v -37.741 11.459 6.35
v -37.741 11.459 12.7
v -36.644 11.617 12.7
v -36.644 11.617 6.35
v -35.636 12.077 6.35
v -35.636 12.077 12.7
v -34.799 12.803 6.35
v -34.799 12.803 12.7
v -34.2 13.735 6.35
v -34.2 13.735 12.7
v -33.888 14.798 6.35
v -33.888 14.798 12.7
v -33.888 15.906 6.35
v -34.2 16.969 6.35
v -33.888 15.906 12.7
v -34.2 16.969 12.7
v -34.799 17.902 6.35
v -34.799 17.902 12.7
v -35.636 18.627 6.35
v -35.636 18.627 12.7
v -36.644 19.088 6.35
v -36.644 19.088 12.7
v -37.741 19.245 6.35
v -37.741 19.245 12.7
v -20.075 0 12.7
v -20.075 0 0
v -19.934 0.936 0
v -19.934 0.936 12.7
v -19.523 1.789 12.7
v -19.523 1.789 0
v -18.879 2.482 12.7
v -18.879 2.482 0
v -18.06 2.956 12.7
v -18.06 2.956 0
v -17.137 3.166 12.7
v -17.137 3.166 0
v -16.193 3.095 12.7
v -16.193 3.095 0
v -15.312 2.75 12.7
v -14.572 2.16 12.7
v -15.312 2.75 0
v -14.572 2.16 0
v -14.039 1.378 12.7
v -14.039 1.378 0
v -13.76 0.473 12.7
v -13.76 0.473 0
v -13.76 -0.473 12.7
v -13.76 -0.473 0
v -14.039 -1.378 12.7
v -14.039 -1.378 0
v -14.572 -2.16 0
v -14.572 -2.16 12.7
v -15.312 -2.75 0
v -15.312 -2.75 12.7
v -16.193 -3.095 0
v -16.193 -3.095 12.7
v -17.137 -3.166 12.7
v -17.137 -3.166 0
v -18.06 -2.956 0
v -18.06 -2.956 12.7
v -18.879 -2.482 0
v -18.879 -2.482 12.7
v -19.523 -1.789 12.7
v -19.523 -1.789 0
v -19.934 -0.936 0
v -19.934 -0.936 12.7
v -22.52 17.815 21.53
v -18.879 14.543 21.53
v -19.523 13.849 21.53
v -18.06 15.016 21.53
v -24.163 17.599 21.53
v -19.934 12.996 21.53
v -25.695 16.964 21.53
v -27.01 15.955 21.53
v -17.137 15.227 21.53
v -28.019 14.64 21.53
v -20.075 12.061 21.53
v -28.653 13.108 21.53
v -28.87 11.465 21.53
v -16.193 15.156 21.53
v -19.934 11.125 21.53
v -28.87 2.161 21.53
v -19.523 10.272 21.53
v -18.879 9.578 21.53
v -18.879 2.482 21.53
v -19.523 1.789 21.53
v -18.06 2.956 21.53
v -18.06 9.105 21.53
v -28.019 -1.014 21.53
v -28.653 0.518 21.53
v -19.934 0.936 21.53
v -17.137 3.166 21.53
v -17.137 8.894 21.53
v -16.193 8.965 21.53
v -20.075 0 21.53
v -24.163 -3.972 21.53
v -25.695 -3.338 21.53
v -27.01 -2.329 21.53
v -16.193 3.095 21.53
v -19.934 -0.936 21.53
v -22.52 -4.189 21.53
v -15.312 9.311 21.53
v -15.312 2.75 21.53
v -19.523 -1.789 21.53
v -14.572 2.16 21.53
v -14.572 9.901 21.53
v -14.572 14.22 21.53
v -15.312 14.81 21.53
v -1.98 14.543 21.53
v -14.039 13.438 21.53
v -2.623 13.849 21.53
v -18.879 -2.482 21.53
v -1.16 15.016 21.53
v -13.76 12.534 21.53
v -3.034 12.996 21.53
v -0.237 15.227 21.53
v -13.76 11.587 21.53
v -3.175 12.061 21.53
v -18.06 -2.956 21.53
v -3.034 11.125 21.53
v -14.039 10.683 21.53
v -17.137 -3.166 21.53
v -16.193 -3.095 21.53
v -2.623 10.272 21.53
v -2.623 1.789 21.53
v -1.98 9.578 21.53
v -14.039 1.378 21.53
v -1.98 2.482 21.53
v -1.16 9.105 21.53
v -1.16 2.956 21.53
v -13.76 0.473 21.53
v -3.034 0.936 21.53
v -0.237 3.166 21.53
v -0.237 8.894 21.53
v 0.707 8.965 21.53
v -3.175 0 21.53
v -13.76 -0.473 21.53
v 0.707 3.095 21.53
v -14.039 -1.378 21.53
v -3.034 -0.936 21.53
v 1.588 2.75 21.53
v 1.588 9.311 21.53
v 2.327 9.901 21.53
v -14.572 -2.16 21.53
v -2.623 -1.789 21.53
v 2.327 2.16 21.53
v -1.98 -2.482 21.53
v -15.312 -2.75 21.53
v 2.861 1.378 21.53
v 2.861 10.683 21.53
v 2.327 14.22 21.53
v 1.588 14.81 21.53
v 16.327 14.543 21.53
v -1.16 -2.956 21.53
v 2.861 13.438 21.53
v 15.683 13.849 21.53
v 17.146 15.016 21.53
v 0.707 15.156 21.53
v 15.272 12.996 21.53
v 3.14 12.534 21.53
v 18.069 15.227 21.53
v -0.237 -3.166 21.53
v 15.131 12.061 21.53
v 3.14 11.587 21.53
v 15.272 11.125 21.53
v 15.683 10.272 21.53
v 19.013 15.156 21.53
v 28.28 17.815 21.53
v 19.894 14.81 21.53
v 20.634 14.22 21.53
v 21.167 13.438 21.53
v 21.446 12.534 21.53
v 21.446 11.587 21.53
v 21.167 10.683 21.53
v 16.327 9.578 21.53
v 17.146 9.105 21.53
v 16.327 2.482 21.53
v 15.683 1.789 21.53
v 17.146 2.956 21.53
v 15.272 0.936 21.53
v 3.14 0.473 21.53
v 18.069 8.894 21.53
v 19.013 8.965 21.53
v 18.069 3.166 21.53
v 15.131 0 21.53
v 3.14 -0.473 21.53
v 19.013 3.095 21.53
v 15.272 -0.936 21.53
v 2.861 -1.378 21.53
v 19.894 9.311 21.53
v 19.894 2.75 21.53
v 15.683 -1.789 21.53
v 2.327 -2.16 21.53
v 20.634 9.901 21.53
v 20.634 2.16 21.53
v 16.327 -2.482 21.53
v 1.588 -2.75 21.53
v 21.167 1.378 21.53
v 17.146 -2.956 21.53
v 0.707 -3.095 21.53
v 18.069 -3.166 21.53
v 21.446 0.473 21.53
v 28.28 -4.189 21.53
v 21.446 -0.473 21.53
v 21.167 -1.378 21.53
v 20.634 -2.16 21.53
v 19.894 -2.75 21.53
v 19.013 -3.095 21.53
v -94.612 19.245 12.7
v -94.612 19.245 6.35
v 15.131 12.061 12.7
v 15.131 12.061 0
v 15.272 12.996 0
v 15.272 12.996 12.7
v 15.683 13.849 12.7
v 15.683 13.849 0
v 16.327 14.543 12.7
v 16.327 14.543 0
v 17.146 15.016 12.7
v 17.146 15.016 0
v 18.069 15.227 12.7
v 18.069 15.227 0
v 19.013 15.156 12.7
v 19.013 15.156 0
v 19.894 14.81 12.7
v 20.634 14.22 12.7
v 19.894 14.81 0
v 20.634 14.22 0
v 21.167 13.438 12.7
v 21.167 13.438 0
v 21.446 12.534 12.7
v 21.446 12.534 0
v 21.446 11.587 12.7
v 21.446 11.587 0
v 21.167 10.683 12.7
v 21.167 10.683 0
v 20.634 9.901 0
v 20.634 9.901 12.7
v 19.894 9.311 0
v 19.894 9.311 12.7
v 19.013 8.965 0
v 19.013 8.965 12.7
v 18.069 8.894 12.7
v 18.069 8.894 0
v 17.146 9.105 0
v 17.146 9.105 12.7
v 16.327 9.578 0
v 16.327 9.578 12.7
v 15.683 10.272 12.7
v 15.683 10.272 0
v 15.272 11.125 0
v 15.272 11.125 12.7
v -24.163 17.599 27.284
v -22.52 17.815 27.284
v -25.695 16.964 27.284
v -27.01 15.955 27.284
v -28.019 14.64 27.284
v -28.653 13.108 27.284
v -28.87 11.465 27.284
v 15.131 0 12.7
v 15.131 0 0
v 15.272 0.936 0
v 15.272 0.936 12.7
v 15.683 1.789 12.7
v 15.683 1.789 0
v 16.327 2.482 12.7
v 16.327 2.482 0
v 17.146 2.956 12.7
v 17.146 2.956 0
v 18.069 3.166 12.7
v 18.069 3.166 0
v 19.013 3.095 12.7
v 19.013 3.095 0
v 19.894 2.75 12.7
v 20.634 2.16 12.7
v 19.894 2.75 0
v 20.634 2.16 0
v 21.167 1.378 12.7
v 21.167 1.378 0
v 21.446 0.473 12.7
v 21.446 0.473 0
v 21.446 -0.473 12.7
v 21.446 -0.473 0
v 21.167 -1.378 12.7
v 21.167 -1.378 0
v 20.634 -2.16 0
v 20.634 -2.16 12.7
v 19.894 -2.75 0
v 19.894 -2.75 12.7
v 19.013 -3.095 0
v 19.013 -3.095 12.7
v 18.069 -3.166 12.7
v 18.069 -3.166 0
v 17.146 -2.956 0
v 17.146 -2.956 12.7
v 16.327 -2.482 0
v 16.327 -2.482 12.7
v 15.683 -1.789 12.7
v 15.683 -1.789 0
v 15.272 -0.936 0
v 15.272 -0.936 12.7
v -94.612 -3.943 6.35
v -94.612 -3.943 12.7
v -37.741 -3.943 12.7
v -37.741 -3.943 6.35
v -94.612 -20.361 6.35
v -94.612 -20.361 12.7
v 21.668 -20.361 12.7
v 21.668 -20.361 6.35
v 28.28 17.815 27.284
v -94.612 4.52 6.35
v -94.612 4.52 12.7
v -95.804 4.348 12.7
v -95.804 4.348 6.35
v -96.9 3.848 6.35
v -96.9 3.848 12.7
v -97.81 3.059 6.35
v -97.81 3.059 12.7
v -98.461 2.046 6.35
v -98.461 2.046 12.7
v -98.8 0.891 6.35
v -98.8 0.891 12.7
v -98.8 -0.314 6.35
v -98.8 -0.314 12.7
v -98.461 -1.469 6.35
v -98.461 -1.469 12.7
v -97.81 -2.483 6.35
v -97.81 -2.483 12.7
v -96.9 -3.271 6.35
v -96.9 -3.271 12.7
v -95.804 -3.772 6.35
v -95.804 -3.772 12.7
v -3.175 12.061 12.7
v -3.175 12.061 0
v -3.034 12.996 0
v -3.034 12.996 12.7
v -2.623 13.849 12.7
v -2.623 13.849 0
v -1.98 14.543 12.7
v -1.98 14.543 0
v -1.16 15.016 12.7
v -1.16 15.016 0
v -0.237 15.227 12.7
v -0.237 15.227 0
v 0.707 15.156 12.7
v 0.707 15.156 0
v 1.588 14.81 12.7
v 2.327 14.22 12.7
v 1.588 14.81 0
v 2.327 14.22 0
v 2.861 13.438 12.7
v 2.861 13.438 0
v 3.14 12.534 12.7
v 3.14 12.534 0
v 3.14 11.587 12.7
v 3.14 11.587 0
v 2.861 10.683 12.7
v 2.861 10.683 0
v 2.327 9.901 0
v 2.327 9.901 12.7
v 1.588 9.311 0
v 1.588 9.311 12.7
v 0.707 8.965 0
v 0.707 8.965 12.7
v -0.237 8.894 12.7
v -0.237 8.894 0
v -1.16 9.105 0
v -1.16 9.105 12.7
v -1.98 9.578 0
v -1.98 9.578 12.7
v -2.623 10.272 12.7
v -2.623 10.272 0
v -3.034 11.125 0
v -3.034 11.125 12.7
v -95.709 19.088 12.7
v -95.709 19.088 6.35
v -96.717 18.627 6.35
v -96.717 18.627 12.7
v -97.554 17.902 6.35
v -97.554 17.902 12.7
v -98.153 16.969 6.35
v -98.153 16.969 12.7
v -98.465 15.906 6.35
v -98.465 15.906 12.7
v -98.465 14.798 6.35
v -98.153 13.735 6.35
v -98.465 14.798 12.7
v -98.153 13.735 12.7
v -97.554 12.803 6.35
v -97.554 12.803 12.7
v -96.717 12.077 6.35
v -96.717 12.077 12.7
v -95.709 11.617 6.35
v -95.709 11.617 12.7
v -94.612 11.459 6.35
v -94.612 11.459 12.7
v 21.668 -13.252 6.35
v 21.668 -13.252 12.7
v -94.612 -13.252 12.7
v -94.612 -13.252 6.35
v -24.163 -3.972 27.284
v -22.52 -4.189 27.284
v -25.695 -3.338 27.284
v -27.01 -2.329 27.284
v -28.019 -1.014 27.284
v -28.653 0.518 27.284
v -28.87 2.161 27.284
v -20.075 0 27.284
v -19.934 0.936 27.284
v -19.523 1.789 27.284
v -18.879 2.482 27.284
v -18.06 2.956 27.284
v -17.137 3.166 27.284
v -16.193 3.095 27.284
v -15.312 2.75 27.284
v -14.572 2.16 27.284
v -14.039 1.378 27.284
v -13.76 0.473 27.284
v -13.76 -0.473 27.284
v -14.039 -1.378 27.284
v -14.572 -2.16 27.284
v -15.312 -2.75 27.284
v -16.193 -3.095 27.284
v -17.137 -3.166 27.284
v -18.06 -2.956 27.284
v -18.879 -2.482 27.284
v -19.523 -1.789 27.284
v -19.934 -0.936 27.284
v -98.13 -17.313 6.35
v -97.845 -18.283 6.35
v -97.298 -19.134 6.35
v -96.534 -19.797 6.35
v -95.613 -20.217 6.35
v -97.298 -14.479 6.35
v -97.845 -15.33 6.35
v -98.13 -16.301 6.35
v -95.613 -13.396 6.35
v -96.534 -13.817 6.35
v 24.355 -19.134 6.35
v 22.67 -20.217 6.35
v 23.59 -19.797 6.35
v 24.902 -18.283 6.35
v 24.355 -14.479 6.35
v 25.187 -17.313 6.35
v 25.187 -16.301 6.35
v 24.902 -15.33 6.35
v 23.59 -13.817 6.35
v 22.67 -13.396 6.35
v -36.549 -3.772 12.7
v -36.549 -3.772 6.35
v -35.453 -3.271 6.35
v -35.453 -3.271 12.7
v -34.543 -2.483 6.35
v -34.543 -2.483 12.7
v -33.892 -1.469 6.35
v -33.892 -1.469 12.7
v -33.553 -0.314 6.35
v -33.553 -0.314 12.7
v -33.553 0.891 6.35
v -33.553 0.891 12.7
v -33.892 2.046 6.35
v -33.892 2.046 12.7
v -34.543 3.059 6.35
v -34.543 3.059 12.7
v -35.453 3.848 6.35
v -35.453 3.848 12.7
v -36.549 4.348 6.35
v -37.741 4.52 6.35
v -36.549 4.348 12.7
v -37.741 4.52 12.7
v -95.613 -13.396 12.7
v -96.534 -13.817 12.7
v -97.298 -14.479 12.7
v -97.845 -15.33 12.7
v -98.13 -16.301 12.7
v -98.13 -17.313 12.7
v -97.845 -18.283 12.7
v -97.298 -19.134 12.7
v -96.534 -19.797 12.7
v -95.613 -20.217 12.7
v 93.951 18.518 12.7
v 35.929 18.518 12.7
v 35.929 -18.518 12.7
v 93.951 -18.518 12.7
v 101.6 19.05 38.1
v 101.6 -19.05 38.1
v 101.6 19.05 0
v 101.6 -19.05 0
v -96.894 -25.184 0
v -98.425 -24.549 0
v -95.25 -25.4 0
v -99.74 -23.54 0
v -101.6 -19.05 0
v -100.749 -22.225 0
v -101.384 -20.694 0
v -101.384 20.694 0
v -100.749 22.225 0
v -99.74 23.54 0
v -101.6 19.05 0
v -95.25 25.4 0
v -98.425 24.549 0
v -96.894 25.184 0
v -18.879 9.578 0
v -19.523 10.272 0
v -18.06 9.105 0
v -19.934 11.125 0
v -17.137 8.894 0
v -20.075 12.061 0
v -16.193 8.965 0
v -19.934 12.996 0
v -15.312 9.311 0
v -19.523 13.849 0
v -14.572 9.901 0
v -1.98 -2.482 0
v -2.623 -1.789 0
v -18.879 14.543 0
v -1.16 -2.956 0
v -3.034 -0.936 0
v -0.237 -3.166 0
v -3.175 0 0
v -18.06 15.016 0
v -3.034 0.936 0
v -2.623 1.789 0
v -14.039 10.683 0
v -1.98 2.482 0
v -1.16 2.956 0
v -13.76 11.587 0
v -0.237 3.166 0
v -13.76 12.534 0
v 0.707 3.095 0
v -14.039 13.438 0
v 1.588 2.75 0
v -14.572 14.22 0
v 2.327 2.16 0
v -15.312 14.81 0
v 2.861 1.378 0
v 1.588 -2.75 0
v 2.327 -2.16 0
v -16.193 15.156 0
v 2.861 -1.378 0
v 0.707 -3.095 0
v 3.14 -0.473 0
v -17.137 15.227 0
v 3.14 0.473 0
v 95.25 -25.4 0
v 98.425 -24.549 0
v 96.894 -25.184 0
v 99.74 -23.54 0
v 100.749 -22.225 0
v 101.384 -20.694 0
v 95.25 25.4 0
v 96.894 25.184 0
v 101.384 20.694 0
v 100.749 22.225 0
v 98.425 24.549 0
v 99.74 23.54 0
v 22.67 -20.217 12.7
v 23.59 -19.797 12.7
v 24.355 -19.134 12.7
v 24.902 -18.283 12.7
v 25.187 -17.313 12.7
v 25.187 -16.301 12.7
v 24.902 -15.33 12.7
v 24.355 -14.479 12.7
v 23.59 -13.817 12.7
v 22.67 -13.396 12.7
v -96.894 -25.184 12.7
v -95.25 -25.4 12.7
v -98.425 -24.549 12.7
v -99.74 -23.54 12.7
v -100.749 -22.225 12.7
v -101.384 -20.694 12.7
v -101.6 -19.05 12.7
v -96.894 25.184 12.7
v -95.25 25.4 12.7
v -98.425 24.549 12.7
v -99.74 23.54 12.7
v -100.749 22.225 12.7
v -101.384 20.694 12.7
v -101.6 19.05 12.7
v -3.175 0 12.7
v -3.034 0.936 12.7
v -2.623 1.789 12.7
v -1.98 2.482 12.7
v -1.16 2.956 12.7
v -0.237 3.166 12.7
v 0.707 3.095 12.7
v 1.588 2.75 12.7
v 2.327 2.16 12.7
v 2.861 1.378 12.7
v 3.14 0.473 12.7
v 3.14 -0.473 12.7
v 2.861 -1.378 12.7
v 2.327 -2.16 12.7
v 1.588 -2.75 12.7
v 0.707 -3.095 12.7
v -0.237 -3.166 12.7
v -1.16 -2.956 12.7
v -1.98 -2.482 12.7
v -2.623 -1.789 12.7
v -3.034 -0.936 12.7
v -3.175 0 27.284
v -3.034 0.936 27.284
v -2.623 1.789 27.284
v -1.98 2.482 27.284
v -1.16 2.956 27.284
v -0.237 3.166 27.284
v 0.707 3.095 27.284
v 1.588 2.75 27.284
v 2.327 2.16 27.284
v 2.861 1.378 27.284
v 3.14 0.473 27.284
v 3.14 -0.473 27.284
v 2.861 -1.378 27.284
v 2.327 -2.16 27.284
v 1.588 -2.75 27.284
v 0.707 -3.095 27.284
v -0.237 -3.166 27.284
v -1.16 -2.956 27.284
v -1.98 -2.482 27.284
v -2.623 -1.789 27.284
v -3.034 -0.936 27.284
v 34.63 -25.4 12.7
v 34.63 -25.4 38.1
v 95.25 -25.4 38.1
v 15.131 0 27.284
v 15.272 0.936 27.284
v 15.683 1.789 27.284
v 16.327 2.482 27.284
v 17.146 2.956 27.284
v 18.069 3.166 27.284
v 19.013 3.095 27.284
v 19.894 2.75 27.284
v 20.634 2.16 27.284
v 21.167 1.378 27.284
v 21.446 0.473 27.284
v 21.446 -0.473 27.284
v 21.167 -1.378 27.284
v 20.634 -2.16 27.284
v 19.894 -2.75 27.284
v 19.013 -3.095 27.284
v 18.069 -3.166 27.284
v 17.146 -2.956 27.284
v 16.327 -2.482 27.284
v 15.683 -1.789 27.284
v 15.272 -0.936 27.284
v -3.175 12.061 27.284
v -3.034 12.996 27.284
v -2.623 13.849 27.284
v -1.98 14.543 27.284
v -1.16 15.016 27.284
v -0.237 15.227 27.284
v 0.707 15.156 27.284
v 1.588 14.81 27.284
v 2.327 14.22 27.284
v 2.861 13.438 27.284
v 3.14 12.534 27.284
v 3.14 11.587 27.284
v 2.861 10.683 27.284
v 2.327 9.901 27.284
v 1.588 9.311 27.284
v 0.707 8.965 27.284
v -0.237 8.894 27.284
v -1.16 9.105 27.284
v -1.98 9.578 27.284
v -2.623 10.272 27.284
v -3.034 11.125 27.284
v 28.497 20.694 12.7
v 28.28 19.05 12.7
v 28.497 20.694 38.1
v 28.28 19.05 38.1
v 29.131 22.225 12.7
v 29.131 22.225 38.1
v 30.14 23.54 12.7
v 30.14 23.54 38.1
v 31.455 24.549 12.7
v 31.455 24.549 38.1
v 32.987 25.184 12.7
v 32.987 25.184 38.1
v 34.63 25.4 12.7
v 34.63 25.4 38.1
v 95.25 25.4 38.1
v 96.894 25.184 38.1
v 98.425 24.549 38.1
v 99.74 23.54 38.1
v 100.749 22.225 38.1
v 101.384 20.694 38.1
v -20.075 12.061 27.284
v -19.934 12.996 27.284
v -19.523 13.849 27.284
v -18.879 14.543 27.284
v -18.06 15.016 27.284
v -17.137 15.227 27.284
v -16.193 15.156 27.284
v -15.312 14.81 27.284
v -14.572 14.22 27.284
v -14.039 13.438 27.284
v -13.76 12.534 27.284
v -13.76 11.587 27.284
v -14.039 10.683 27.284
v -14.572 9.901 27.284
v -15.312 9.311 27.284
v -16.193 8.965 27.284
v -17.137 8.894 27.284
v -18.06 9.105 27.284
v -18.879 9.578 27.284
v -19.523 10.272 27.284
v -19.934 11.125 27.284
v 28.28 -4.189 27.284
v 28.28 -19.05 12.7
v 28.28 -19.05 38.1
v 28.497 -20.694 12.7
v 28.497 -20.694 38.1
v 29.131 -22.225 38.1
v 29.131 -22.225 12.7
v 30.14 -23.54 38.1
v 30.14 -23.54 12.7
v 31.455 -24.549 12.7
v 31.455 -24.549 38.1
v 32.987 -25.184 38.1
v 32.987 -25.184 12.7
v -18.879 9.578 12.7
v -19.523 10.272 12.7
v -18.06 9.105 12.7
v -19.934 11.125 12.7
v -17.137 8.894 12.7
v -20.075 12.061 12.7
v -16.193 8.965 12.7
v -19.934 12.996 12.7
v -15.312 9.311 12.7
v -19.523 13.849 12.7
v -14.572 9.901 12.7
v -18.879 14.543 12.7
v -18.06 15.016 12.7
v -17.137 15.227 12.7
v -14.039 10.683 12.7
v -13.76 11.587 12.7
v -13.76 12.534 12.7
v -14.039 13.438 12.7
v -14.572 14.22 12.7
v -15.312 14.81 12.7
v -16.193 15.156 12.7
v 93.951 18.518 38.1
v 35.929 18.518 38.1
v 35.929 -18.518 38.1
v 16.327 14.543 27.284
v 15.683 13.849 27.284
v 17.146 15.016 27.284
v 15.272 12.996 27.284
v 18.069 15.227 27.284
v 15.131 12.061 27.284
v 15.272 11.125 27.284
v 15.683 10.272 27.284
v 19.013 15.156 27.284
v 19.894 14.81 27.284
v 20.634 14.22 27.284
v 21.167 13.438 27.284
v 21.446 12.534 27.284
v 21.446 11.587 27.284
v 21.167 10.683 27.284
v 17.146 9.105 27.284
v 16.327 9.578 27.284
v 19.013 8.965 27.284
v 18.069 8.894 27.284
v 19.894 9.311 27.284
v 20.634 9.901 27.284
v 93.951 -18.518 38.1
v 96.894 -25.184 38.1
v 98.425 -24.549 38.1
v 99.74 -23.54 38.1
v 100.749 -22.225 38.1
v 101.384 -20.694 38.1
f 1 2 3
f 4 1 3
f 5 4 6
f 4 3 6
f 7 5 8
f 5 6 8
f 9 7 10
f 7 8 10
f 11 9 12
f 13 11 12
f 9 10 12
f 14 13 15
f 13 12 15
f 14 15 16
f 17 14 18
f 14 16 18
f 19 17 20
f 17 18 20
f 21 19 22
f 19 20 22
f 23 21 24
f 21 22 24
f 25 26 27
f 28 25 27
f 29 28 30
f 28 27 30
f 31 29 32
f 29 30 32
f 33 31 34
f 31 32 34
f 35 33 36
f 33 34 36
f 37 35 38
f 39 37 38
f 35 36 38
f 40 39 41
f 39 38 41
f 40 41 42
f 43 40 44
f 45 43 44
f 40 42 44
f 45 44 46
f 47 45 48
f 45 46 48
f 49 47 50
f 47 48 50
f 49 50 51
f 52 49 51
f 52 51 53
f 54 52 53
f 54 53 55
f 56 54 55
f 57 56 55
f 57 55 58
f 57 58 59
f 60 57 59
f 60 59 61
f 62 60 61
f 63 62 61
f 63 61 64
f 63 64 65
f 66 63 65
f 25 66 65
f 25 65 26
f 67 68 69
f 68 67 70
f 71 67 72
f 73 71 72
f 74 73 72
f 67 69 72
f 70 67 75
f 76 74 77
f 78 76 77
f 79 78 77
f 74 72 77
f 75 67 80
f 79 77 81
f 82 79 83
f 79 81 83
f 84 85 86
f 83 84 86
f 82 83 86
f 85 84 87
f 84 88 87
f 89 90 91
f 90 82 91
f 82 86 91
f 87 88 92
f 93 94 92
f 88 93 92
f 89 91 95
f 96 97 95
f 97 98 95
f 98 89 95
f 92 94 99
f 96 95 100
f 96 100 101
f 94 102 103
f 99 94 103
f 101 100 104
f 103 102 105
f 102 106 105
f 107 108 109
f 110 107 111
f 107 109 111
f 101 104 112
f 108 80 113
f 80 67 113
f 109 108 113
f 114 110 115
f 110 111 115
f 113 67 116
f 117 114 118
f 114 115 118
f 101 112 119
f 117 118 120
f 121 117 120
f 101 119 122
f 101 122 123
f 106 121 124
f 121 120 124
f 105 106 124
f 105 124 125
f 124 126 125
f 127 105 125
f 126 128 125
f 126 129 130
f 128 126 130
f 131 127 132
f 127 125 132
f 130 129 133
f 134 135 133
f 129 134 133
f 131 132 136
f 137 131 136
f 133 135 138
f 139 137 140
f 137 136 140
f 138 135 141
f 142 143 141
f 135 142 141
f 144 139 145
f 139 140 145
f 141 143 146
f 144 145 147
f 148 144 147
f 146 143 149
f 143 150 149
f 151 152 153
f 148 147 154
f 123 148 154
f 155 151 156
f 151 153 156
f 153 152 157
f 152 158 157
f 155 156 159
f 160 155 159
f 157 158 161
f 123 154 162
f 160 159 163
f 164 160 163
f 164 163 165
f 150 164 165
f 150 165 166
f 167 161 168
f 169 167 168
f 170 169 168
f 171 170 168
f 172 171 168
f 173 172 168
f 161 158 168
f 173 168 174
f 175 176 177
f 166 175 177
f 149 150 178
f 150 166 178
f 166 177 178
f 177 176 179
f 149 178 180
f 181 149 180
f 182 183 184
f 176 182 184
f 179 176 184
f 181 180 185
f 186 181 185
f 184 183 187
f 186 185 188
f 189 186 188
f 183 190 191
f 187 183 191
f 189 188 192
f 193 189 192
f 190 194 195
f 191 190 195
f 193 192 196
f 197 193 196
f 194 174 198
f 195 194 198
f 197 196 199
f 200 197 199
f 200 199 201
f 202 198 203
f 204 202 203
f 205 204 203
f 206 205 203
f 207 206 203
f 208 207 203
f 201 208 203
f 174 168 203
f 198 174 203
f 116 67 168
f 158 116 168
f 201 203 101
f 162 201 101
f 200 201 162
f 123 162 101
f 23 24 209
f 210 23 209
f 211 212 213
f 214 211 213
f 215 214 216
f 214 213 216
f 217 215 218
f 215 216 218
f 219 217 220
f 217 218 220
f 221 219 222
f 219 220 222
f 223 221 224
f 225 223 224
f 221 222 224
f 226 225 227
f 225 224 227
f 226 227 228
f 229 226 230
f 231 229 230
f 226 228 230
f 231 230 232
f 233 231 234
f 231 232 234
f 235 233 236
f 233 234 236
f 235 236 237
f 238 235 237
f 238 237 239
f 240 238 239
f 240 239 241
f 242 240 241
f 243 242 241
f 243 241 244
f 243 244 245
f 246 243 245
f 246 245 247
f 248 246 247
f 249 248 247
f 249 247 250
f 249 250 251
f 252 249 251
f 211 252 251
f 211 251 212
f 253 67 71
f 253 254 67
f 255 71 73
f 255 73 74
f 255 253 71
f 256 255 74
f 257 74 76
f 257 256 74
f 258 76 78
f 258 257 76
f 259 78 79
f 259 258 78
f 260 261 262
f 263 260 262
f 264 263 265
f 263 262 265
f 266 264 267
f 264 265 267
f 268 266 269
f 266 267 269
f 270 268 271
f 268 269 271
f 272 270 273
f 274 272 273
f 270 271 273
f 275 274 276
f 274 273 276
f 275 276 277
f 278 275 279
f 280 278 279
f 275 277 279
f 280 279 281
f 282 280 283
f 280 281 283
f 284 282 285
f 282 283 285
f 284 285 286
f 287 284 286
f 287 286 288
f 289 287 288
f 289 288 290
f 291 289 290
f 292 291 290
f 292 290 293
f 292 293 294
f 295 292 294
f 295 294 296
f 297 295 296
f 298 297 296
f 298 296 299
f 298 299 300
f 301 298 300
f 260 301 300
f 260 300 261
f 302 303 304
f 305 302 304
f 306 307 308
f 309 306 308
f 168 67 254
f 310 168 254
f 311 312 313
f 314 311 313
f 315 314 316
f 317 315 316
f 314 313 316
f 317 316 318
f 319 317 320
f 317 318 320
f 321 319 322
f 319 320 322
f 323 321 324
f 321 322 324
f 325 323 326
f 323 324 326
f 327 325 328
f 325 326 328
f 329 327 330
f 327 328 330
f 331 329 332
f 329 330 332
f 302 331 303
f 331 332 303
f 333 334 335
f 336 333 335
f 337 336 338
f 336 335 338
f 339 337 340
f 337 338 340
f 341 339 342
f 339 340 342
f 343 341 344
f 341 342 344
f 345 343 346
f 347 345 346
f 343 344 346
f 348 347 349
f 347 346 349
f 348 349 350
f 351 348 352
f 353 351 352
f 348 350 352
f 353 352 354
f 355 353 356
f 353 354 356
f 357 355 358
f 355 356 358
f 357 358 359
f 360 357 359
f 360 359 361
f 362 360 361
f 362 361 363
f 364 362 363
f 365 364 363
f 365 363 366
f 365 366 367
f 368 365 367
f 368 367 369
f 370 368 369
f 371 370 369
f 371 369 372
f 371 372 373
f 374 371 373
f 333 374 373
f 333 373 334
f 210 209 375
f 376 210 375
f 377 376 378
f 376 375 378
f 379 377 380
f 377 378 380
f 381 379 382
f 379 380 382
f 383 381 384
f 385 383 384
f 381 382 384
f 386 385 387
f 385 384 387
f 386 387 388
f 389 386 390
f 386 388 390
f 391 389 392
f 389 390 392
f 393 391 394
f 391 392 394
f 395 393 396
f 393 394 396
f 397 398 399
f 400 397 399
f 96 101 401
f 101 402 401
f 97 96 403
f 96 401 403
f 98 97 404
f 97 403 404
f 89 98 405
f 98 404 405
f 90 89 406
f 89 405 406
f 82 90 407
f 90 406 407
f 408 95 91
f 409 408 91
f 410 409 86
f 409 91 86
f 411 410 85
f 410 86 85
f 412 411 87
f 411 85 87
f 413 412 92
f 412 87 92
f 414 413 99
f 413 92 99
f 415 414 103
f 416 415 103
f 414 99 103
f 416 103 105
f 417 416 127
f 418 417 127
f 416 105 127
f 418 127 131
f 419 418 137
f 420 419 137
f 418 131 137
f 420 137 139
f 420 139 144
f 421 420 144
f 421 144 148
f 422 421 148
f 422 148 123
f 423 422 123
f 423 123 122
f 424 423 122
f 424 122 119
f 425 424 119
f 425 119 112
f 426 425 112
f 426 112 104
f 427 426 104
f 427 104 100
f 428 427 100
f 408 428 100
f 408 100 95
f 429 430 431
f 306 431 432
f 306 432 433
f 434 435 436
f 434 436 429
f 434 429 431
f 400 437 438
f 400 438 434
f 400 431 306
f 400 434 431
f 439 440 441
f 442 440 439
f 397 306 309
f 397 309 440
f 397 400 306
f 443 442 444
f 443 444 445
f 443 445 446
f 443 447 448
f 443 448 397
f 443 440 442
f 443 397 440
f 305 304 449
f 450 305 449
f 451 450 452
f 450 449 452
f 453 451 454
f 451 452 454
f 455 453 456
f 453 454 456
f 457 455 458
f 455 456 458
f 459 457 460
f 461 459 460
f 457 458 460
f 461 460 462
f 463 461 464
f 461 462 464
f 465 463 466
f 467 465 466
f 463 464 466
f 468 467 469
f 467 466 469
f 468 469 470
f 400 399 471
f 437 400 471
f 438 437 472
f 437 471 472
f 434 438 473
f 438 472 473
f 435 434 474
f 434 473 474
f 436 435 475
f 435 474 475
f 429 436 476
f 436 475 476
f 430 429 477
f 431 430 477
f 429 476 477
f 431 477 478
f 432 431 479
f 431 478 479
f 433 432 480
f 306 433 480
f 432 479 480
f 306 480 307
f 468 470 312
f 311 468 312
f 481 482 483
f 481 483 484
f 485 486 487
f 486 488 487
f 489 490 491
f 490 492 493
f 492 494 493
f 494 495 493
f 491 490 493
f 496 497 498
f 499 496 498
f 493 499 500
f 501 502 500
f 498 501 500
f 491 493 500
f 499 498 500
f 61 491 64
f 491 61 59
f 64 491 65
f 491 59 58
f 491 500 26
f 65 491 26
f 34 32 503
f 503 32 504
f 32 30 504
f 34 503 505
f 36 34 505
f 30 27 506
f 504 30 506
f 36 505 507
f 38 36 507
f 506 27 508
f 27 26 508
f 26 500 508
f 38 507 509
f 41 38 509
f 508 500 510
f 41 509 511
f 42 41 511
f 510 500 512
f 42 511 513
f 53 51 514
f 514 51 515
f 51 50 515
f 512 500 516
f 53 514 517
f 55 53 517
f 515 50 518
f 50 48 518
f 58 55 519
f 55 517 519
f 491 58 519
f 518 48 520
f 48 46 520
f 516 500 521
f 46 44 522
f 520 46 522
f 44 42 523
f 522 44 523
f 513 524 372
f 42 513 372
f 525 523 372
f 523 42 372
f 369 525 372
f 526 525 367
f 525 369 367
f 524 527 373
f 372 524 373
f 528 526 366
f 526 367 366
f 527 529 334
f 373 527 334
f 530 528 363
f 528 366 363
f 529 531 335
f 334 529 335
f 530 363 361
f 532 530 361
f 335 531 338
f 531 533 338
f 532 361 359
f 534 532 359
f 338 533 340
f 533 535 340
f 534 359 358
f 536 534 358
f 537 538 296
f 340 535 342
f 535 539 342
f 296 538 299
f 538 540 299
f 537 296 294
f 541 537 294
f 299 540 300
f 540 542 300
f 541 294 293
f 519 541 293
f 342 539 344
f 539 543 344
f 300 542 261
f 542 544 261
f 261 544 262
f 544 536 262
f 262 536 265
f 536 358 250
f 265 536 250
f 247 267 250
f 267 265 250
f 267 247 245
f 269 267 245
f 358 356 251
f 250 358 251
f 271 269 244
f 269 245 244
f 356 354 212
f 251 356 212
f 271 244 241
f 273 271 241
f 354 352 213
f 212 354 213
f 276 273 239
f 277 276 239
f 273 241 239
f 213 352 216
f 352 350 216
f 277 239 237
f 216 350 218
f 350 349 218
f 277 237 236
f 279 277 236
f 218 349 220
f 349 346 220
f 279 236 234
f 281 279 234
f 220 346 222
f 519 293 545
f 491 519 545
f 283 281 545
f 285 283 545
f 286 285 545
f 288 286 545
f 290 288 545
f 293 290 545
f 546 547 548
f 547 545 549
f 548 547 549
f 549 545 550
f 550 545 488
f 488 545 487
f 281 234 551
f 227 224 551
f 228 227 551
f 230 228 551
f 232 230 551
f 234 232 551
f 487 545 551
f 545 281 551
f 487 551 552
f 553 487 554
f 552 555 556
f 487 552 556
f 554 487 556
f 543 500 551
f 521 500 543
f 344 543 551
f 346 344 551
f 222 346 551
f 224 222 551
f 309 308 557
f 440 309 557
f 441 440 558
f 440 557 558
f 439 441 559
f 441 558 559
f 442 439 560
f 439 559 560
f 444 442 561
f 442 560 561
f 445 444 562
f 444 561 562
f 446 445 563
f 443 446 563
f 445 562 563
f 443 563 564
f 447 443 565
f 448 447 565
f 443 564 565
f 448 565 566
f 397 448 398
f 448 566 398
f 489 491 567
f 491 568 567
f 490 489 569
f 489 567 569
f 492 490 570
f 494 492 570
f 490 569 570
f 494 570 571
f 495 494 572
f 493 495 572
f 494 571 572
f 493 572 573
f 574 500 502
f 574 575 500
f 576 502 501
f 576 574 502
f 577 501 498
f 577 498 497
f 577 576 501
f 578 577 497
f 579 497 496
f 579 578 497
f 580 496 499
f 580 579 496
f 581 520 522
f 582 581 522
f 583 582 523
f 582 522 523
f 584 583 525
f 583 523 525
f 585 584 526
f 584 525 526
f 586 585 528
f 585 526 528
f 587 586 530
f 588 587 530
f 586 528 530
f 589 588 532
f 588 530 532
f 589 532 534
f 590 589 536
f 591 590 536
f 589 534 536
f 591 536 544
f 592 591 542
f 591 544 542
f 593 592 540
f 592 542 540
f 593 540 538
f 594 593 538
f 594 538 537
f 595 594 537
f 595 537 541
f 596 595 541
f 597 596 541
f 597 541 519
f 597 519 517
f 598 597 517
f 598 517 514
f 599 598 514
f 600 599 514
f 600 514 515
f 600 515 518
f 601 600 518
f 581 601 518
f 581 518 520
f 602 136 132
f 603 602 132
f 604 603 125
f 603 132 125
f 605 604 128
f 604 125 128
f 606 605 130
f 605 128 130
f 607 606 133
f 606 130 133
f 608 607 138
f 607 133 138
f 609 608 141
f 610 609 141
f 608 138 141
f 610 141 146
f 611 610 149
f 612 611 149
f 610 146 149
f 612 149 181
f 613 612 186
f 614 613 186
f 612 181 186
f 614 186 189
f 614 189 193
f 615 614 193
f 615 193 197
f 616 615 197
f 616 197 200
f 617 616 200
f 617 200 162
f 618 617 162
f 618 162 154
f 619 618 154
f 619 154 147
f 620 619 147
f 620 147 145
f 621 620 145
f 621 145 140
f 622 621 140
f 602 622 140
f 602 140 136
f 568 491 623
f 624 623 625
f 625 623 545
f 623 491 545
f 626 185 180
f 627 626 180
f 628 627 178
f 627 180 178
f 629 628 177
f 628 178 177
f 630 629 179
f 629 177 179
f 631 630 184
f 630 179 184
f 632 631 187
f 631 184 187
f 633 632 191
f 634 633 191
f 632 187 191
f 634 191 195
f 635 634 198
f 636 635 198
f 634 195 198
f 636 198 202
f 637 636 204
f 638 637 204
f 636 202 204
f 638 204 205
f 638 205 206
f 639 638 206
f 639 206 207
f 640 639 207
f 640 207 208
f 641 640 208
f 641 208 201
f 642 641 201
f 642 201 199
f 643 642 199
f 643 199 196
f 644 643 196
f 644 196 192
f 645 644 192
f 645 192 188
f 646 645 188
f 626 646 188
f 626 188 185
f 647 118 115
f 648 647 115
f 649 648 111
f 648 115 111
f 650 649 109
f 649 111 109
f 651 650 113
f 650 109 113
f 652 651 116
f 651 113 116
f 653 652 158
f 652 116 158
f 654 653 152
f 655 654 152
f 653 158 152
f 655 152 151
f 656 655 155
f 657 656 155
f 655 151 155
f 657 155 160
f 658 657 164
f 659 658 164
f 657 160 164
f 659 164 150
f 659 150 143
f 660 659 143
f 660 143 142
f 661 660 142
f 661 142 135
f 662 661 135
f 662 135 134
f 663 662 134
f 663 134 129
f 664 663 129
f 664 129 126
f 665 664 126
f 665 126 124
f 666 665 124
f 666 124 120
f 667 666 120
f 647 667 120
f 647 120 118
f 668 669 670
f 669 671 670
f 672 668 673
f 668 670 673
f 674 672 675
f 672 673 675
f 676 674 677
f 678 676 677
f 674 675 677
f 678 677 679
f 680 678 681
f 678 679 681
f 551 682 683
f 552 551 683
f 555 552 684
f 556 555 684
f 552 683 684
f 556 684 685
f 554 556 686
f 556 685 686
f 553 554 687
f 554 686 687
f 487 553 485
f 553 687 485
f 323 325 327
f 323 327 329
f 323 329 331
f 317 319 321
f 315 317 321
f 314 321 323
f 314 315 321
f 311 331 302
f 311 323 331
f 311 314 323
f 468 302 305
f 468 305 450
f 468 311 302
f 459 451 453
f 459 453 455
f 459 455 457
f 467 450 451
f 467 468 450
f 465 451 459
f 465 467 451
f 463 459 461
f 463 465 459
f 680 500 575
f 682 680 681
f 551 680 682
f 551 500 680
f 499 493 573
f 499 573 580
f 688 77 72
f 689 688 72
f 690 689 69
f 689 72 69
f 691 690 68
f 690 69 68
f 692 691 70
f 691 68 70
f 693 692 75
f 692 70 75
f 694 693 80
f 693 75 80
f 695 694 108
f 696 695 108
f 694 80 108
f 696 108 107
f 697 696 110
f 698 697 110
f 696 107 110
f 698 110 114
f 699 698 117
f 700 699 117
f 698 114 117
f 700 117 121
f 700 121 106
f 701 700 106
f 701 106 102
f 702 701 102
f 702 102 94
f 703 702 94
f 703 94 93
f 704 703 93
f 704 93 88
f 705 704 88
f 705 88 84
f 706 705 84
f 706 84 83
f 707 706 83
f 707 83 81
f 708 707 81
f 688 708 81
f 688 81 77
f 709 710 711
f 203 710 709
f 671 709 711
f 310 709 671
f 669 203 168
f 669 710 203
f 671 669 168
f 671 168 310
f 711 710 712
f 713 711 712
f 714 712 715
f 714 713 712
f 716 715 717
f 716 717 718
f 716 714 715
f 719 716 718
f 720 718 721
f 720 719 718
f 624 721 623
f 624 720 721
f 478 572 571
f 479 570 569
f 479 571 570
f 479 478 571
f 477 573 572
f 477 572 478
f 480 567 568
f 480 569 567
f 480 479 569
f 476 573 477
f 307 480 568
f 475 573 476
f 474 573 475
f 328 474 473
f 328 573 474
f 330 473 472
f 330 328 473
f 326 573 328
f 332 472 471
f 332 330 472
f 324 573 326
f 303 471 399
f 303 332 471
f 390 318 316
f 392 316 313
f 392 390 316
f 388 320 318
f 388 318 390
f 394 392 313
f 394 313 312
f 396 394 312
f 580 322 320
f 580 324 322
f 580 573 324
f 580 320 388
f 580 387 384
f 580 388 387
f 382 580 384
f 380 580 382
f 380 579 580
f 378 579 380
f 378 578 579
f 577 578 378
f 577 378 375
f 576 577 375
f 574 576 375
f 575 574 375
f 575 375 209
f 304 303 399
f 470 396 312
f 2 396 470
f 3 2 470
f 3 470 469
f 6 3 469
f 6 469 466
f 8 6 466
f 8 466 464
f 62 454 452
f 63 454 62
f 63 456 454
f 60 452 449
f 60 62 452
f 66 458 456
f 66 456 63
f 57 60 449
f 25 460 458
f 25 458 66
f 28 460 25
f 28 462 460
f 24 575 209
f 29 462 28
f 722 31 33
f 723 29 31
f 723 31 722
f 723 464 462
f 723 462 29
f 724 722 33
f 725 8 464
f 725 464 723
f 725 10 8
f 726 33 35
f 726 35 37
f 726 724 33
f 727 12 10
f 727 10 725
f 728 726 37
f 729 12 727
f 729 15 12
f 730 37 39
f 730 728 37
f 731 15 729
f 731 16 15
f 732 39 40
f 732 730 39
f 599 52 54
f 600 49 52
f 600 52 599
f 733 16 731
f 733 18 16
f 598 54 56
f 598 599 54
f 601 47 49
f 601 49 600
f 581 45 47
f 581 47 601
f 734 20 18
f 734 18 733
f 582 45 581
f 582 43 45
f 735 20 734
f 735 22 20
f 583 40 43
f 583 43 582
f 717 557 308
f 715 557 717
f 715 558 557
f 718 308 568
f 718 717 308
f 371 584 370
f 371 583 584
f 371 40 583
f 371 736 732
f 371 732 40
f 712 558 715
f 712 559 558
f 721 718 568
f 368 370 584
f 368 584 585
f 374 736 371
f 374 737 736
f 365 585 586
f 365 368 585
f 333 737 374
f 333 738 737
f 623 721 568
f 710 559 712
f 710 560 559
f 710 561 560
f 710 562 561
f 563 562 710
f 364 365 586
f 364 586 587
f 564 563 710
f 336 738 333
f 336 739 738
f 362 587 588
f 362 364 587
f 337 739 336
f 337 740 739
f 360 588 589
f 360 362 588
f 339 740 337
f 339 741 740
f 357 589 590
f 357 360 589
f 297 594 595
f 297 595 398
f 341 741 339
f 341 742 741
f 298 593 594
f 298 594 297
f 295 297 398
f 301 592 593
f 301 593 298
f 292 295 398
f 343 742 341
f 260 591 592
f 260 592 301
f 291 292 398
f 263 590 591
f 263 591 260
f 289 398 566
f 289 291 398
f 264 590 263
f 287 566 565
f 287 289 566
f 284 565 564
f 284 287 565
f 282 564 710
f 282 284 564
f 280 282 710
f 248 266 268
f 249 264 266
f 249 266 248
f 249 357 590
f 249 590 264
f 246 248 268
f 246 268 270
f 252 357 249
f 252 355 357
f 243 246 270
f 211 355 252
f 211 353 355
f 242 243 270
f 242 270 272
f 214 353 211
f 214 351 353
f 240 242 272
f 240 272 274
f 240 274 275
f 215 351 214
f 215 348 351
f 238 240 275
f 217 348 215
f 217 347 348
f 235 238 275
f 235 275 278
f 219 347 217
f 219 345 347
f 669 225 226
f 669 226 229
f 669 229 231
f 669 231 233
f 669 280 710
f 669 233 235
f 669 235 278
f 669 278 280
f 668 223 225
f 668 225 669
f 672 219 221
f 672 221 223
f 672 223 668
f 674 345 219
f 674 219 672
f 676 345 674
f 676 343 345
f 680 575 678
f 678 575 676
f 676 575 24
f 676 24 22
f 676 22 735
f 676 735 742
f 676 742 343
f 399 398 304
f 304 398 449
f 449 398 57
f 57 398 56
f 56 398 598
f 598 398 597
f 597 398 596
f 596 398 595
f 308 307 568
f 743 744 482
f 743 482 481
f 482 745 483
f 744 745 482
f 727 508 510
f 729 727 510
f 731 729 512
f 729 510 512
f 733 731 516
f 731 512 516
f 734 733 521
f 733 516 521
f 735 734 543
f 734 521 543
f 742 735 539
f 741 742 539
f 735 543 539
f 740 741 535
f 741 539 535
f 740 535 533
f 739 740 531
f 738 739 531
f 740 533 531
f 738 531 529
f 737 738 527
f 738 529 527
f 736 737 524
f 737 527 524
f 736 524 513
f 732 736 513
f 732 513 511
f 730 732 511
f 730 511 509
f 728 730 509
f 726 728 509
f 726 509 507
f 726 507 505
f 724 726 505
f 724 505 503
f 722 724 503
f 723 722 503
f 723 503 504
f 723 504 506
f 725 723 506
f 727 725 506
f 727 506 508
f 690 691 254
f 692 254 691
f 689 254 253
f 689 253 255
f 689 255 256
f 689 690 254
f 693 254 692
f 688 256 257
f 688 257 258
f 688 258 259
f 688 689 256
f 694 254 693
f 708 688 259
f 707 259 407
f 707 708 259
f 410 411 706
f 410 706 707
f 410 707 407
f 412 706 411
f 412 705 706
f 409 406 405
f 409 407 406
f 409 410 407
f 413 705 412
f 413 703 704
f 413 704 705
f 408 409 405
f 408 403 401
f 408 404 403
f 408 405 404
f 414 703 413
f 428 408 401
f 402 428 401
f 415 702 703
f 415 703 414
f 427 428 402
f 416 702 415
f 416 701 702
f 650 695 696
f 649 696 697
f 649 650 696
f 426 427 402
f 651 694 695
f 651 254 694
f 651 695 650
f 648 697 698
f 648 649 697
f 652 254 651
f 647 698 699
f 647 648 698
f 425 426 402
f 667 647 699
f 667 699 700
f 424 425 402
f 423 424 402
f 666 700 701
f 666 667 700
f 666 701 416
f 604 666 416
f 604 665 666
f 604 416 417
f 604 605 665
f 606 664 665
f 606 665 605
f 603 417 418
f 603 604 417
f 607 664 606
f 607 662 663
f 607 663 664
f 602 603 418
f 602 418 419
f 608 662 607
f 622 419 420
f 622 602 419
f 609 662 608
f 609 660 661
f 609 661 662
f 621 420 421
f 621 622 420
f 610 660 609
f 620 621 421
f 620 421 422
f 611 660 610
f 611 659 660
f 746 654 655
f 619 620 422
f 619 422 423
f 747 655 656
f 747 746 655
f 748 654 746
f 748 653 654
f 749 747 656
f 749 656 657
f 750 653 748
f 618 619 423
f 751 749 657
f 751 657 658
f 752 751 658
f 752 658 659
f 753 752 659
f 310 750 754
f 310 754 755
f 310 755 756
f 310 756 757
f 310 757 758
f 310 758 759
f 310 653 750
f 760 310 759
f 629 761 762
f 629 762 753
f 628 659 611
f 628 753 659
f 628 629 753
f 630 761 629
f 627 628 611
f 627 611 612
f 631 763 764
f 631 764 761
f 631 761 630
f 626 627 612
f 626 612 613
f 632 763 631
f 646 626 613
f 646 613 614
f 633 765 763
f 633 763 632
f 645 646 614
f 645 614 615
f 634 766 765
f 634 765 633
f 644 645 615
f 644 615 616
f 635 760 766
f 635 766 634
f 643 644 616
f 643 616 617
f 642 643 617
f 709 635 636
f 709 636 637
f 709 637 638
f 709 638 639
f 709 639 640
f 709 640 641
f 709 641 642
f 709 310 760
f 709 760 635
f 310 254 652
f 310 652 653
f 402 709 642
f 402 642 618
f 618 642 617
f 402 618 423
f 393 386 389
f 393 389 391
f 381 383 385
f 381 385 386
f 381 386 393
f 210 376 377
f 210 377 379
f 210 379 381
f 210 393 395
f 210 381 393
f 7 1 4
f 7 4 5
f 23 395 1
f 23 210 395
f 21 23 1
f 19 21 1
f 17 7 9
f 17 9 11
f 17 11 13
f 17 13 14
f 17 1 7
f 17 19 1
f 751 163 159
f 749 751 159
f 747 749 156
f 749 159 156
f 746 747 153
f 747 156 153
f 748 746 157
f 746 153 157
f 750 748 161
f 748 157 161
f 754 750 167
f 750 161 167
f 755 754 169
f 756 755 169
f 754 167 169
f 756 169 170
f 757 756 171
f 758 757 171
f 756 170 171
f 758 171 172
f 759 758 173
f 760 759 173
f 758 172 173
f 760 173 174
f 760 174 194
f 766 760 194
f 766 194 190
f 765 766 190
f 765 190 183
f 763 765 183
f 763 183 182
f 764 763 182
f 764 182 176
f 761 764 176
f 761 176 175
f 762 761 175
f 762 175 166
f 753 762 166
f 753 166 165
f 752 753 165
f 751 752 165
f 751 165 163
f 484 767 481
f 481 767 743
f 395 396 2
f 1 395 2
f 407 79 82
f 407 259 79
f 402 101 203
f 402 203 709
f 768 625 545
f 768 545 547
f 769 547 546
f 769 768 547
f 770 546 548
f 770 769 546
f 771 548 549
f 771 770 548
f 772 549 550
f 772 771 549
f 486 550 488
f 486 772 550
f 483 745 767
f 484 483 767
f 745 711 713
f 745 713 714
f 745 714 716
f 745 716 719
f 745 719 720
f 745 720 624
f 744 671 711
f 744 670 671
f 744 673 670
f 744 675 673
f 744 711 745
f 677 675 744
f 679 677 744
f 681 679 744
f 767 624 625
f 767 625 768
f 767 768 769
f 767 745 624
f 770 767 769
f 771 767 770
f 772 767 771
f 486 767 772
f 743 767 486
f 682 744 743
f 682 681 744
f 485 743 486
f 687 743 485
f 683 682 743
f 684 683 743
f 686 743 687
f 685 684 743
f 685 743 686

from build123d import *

# Parameters (mm, degrees)
F0_W      = 146.954681846
F0_H      = 50.8
F0_W_2    = 56.245318154
F1_DEPTH  = 12.7
F2_W      = 73.3197343707
F2_H      = 50.8
F3_DEPTH  = 25.4
F4_W      = 58.0222320914
F4_H      = 37.0360761881
F5_DEPTH  = 25.4
F7_DEPTH  = 6.35
F8_R      = 6.35
F9_W      = 22.0035612583
F9_H      = 5.7547800243
F10_DEPTH = 57.15
F11_R     = 6.35
F13_D     = 6.35


with BuildPart() as f1:
    # F0 (on Top) → F1 (new body)
    with BuildSketch(Plane.XY):
        with Locations((-28.122659077, 0)):
            Rectangle(F0_W, F0_H)
        with Locations((73.477340923, 0)):
            Rectangle(F0_W_2, F0_H)
    extrude(amount=F1_DEPTH)

    # F2 (on face) → F3 (join)
    with BuildSketch(Plane.XY.offset(12.7)):
        with Locations((64.9401328146, 0)):
            Rectangle(F2_W, F2_H)
    extrude(amount=F3_DEPTH)

    # F4 (on face) → F5 (cut)
    with BuildSketch(Plane.XY.offset(38.1)):
        with Locations((64.9401328146, 0)):
            Rectangle(F4_W, F4_H)
    extrude(amount=-F5_DEPTH, mode=Mode.SUBTRACT)

    # F6 (on face) → F7 (cut)
    with BuildSketch(Plane.XY.offset(12.7)):
        with BuildLine():
            Line((-37.7411283553, 19.2452520132), (-94.6118757129, 19.2452520132))
            ThreePointArc((-94.6118757129, 19.2452520132), (-98.5048138537, 15.3523138724), (-94.6118757129, 11.4593757316))
            Line((-94.6118757129, 11.4593757316), (-37.7411283553, 11.4593757316))
            ThreePointArc((-37.7411283553, 11.4593757316), (-33.8481902145, 15.3523138724), (-37.7411283553, 19.2452520132))
        make_face()
        with BuildLine():
            Line((-37.7411283553, 4.519790411), (-94.6118757129, 4.519790411))
            ThreePointArc((-94.6118757129, 4.519790411), (-98.8433300517, 0.2883360721), (-94.6118757129, -3.9431182668))
            Line((-94.6118757129, -3.9431182668), (-37.7411283553, -3.9431182668))
            ThreePointArc((-37.7411283553, -3.9431182668), (-33.5096740164, 0.2883360721), (-37.7411283553, 4.519790411))
        make_face()
        with BuildLine():
            Line((21.6684918851, -13.2523179054), (-94.6118757129, -13.2523179054))
            ThreePointArc((-94.6118757129, -13.2523179054), (-98.1662971899, -16.8067393824), (-94.6118757129, -20.3611608595))
            Line((-94.6118757129, -20.3611608595), (21.6684918851, -20.3611608595))
            ThreePointArc((21.6684918851, -20.3611608595), (25.2229133621, -16.8067393824), (21.6684918851, -13.2523179054))
        make_face()
    extrude(amount=-F7_DEPTH, mode=Mode.SUBTRACT)

    # F8
    f8_edges = [f1.edges().sort_by_distance(p)[0] for p in [
        (28.280266, -25.4, 25.4),
        (28.280266, 25.4, 25.4),
        (-101.6, -25.4, 6.35),
        (-101.6, 25.4, 6.35),
        (101.6, 25.4, 19.05),
        (101.6, -25.4, 19.05),
    ]]
    fillet(f8_edges, radius=F8_R)

    # F9 (on face) → F10 (join)
    with BuildSketch(Plane(origin=(28.2802656293, 0, 0), x_dir=(0, -1, 0), z_dir=(-1, 0, 0))):
        with Locations((-6.8131443113, 24.4069304317)):
            Rectangle(F9_W, F9_H)
    extrude(amount=F10_DEPTH)

    # F11
    f11_edges = [f1.edges().sort_by_distance(p)[0] for p in [
        (-28.869734, -4.188636, 24.40693),
        (-28.869734, 17.814925, 24.40693),
    ]]
    fillet(f11_edges, radius=F11_R)

    # F13 (through all)
    with Locations(Plane.XY.offset(27.2843204439)):
        with Locations((-16.899863258, 12.0606217533), (0, 12.0606217533), (18.3064360172, 12.0606217533), (18.3064360172, 0), (0, 0), (-16.899863258, 0)):
            Hole(F13_D / 2)


solid = f1.part
